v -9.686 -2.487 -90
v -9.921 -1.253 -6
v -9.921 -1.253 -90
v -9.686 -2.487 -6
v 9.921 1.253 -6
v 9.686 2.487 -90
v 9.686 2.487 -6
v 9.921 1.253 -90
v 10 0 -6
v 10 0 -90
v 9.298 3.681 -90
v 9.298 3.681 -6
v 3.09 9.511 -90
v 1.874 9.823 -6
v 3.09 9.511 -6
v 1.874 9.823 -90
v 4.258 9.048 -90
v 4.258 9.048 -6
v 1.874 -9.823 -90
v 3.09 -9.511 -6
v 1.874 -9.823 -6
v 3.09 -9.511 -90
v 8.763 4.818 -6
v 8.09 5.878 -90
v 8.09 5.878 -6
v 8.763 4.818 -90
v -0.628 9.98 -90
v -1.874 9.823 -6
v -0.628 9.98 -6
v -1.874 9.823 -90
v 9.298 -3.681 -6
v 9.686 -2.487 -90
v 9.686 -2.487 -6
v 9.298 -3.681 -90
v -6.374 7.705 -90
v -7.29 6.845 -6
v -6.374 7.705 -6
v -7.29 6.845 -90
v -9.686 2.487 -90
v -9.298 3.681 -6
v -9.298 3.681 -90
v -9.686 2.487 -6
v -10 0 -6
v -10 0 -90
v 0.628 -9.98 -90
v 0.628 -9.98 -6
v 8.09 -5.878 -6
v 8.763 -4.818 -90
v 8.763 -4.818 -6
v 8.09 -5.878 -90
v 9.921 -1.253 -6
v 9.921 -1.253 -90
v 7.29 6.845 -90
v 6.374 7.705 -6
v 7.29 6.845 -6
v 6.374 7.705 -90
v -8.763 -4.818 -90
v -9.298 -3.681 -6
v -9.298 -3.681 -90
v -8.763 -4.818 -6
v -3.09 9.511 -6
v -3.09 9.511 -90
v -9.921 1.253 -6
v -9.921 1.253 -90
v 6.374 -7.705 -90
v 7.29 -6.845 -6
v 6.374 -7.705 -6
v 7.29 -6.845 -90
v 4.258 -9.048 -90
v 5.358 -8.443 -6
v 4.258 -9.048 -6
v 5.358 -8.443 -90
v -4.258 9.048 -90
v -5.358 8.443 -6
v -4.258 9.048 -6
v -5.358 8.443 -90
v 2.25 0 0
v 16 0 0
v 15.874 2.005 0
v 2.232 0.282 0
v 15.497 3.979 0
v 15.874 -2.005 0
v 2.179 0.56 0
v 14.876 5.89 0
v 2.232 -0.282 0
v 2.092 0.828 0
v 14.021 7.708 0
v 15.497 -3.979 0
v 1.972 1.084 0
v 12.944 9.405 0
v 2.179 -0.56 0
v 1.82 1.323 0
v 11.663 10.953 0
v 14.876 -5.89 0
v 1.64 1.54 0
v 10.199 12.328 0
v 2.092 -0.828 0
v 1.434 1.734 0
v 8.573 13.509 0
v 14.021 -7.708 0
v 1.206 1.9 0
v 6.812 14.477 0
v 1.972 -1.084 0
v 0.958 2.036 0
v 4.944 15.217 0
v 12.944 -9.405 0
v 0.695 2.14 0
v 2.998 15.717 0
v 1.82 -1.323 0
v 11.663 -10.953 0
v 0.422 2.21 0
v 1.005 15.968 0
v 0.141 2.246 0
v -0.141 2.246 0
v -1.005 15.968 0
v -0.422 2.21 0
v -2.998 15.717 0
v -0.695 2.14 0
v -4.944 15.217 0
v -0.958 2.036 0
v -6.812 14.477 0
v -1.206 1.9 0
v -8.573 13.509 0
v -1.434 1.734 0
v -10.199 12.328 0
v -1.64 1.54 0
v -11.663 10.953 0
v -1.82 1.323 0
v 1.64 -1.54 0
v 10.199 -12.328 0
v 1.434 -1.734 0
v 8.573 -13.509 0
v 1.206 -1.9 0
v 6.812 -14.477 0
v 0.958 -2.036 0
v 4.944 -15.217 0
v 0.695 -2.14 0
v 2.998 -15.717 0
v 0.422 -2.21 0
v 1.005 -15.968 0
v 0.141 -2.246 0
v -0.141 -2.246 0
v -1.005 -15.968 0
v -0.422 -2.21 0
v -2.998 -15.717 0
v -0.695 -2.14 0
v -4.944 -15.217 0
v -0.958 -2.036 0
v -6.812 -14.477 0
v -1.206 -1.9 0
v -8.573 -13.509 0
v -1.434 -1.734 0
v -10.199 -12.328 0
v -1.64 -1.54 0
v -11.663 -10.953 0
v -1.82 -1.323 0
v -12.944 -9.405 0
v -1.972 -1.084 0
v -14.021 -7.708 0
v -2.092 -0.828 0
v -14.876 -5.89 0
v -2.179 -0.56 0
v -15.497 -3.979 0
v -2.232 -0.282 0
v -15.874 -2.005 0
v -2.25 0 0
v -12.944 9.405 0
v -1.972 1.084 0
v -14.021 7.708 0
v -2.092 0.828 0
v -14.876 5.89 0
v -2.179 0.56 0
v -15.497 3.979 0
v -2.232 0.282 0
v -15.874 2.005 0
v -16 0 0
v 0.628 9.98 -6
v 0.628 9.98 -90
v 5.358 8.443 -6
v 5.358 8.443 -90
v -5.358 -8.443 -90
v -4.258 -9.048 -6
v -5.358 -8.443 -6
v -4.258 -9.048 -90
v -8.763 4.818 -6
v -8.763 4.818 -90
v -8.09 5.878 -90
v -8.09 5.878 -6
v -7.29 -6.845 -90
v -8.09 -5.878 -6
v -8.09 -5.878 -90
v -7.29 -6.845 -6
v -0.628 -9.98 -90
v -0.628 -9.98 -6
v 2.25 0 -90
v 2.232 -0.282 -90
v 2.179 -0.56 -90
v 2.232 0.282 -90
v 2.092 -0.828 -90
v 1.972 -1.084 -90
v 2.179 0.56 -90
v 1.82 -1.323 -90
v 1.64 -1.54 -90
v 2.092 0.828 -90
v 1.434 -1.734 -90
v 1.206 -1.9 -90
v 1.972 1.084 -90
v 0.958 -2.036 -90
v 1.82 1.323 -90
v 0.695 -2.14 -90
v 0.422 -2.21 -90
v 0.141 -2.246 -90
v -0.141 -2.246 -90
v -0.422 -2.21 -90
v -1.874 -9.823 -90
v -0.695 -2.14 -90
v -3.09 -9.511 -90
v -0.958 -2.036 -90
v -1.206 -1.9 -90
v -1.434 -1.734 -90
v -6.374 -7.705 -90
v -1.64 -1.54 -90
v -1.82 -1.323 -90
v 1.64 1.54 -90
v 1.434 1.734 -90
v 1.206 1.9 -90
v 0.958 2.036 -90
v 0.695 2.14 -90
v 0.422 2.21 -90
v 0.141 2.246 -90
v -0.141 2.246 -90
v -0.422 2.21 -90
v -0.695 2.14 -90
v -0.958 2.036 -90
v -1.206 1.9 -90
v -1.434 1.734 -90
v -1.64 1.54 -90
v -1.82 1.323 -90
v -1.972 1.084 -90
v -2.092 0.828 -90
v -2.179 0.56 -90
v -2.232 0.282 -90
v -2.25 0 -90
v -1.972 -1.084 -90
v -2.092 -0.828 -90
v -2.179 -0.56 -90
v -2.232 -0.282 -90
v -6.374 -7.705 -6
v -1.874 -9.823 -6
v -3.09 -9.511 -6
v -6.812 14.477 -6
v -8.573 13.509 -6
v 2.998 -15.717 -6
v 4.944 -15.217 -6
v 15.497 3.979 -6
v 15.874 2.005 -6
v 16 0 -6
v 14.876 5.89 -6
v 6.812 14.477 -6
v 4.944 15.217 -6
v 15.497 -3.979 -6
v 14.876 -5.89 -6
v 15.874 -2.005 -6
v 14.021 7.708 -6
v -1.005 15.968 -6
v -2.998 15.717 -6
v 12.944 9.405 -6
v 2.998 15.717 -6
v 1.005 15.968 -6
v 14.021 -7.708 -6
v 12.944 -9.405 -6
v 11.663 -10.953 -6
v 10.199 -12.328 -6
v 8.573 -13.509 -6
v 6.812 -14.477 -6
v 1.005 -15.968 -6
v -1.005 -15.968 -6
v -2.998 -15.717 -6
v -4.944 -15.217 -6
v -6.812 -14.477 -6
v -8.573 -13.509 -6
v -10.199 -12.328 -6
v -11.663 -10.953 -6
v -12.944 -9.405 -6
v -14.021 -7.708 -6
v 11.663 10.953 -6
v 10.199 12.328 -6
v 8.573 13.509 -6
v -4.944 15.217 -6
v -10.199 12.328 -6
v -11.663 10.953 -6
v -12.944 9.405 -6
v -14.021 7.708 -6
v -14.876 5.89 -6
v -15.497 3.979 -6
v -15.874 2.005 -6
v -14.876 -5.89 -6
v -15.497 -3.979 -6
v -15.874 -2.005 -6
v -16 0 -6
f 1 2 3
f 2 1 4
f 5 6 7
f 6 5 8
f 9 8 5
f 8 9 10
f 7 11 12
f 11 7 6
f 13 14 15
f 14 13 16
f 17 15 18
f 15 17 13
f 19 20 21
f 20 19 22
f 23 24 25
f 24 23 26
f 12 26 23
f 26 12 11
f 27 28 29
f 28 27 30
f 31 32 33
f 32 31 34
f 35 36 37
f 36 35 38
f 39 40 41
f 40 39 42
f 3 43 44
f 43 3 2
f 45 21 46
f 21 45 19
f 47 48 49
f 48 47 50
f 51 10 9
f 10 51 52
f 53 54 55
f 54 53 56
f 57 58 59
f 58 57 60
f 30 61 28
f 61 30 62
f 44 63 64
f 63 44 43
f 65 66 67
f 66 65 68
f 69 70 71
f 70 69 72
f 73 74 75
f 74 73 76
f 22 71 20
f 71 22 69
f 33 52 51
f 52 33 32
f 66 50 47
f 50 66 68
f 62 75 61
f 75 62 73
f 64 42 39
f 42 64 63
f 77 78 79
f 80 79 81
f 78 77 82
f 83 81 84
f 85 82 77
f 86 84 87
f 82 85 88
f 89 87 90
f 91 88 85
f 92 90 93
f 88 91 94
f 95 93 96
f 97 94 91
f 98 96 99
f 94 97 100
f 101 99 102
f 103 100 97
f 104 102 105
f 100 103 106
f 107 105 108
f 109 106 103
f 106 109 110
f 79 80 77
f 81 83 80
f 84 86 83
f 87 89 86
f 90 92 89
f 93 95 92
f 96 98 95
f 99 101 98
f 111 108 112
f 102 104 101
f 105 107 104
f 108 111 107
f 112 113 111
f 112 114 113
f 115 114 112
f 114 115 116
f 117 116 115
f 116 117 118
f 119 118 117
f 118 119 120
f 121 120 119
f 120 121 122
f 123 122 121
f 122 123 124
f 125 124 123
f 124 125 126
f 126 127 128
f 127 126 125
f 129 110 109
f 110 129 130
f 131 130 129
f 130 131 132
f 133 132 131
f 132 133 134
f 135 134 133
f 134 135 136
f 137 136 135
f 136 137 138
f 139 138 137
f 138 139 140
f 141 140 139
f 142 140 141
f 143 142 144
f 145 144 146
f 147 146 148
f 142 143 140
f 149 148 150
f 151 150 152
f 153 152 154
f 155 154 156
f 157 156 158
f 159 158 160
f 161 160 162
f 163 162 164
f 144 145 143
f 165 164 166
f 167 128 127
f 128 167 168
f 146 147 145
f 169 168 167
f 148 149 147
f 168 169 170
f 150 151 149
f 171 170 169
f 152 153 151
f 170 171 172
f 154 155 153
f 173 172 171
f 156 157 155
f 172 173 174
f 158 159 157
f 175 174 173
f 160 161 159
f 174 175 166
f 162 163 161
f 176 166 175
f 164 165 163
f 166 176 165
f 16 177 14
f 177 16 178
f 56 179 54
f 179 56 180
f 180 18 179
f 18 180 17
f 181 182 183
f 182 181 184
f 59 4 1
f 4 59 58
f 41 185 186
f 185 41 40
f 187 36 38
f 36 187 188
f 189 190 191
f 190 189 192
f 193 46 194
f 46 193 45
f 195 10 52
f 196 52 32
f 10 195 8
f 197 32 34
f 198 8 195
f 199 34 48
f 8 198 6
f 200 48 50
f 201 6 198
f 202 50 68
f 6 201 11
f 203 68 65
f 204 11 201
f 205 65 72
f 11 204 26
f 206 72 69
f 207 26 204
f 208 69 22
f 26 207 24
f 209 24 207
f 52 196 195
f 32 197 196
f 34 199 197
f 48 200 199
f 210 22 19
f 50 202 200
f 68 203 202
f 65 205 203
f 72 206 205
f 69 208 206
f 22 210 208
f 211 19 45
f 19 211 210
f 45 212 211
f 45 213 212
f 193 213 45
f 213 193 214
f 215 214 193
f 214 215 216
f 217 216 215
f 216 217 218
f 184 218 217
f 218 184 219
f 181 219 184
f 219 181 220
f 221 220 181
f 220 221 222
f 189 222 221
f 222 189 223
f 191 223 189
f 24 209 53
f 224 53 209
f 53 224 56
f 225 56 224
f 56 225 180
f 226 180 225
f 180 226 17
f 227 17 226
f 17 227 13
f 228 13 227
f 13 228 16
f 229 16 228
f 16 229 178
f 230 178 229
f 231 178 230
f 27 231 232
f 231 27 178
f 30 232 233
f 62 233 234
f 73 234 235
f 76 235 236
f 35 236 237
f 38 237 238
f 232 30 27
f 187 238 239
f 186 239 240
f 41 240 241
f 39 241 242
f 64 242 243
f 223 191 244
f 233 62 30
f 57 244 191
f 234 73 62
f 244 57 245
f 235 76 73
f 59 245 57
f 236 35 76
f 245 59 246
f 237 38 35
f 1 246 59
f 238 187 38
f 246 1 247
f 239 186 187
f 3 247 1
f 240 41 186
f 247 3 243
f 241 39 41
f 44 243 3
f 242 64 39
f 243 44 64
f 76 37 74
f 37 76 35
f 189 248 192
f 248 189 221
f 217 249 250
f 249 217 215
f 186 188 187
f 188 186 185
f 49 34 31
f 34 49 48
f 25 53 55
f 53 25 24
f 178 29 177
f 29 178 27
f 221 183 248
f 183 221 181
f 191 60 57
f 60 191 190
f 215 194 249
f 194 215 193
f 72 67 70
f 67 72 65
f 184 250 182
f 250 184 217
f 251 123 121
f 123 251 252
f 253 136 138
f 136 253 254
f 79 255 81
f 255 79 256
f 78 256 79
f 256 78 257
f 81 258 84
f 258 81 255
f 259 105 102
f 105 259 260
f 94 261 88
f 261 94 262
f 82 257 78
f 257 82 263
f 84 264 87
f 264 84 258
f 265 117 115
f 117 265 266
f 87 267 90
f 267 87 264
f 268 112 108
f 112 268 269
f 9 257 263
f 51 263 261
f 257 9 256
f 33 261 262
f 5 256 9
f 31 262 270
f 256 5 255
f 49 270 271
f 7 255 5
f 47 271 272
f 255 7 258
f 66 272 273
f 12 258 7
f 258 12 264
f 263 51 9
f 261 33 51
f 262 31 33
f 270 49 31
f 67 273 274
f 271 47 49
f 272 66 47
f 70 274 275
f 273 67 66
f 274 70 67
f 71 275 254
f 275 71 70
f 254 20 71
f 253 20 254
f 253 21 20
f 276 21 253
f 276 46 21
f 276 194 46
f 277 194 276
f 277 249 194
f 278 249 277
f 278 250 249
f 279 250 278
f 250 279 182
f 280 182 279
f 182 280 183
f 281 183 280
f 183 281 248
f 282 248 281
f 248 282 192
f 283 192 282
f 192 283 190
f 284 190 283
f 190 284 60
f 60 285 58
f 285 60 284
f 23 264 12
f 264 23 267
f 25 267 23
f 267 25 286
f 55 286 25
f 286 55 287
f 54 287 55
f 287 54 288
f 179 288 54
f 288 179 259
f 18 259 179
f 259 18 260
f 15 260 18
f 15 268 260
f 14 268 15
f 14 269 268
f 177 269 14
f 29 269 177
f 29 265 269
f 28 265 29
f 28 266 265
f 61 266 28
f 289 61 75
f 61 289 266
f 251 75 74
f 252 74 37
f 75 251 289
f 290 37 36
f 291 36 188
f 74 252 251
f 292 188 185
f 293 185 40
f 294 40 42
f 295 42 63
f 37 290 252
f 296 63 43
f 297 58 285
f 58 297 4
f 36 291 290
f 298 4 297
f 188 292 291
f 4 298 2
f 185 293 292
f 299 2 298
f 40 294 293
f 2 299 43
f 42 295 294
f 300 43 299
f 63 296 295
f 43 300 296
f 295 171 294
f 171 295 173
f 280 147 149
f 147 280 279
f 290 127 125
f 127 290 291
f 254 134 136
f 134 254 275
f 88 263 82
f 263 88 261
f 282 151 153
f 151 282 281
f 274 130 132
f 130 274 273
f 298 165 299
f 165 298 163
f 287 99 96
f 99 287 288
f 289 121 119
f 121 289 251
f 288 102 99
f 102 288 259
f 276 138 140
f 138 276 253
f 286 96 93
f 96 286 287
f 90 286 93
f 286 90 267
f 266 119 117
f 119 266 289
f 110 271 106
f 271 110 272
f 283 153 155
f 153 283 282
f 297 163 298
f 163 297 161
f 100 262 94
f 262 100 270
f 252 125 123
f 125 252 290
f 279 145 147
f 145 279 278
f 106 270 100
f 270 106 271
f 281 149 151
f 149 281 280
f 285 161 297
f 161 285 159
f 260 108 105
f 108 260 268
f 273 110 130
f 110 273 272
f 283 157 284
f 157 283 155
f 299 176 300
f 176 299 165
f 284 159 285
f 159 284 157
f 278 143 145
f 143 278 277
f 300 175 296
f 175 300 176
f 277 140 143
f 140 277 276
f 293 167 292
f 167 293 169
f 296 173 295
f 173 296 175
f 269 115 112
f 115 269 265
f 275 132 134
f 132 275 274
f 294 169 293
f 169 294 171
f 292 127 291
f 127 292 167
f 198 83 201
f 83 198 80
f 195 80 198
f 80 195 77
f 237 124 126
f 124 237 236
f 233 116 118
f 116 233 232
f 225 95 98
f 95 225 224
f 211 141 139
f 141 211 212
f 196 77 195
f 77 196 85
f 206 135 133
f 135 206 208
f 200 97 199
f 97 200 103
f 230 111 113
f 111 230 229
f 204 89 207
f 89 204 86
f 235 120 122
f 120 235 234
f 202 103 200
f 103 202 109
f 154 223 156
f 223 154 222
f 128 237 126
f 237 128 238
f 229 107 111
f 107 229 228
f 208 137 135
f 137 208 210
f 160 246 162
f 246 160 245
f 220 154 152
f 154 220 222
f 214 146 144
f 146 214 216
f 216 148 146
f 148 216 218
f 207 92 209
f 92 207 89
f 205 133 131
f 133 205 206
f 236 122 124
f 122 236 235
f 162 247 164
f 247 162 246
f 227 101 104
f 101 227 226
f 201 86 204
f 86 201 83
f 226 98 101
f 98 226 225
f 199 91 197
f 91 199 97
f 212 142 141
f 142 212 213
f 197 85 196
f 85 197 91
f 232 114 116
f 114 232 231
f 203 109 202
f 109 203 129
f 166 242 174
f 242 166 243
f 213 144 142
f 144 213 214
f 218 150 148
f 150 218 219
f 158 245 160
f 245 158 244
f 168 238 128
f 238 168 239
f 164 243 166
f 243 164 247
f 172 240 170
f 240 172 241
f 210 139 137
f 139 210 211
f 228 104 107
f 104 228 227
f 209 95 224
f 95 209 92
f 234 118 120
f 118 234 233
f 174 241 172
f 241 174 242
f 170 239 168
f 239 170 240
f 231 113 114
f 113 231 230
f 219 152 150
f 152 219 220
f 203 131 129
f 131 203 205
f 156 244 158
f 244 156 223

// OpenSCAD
$fn = 50;


difference() {
	union() {
		translate(v = [0, 0, -90.0000000000]) {
			cylinder(h = 90, r = 10.0000000000);
		}
		translate(v = [0, 0, -6.0000000000]) {
			cylinder(h = 6, r = 16.0000000000);
		}
	}
	union() {
		#translate(v = [0, 0, -90]) {
			cylinder(h = 90, r = 2.2500000000);
		}
	}
}
